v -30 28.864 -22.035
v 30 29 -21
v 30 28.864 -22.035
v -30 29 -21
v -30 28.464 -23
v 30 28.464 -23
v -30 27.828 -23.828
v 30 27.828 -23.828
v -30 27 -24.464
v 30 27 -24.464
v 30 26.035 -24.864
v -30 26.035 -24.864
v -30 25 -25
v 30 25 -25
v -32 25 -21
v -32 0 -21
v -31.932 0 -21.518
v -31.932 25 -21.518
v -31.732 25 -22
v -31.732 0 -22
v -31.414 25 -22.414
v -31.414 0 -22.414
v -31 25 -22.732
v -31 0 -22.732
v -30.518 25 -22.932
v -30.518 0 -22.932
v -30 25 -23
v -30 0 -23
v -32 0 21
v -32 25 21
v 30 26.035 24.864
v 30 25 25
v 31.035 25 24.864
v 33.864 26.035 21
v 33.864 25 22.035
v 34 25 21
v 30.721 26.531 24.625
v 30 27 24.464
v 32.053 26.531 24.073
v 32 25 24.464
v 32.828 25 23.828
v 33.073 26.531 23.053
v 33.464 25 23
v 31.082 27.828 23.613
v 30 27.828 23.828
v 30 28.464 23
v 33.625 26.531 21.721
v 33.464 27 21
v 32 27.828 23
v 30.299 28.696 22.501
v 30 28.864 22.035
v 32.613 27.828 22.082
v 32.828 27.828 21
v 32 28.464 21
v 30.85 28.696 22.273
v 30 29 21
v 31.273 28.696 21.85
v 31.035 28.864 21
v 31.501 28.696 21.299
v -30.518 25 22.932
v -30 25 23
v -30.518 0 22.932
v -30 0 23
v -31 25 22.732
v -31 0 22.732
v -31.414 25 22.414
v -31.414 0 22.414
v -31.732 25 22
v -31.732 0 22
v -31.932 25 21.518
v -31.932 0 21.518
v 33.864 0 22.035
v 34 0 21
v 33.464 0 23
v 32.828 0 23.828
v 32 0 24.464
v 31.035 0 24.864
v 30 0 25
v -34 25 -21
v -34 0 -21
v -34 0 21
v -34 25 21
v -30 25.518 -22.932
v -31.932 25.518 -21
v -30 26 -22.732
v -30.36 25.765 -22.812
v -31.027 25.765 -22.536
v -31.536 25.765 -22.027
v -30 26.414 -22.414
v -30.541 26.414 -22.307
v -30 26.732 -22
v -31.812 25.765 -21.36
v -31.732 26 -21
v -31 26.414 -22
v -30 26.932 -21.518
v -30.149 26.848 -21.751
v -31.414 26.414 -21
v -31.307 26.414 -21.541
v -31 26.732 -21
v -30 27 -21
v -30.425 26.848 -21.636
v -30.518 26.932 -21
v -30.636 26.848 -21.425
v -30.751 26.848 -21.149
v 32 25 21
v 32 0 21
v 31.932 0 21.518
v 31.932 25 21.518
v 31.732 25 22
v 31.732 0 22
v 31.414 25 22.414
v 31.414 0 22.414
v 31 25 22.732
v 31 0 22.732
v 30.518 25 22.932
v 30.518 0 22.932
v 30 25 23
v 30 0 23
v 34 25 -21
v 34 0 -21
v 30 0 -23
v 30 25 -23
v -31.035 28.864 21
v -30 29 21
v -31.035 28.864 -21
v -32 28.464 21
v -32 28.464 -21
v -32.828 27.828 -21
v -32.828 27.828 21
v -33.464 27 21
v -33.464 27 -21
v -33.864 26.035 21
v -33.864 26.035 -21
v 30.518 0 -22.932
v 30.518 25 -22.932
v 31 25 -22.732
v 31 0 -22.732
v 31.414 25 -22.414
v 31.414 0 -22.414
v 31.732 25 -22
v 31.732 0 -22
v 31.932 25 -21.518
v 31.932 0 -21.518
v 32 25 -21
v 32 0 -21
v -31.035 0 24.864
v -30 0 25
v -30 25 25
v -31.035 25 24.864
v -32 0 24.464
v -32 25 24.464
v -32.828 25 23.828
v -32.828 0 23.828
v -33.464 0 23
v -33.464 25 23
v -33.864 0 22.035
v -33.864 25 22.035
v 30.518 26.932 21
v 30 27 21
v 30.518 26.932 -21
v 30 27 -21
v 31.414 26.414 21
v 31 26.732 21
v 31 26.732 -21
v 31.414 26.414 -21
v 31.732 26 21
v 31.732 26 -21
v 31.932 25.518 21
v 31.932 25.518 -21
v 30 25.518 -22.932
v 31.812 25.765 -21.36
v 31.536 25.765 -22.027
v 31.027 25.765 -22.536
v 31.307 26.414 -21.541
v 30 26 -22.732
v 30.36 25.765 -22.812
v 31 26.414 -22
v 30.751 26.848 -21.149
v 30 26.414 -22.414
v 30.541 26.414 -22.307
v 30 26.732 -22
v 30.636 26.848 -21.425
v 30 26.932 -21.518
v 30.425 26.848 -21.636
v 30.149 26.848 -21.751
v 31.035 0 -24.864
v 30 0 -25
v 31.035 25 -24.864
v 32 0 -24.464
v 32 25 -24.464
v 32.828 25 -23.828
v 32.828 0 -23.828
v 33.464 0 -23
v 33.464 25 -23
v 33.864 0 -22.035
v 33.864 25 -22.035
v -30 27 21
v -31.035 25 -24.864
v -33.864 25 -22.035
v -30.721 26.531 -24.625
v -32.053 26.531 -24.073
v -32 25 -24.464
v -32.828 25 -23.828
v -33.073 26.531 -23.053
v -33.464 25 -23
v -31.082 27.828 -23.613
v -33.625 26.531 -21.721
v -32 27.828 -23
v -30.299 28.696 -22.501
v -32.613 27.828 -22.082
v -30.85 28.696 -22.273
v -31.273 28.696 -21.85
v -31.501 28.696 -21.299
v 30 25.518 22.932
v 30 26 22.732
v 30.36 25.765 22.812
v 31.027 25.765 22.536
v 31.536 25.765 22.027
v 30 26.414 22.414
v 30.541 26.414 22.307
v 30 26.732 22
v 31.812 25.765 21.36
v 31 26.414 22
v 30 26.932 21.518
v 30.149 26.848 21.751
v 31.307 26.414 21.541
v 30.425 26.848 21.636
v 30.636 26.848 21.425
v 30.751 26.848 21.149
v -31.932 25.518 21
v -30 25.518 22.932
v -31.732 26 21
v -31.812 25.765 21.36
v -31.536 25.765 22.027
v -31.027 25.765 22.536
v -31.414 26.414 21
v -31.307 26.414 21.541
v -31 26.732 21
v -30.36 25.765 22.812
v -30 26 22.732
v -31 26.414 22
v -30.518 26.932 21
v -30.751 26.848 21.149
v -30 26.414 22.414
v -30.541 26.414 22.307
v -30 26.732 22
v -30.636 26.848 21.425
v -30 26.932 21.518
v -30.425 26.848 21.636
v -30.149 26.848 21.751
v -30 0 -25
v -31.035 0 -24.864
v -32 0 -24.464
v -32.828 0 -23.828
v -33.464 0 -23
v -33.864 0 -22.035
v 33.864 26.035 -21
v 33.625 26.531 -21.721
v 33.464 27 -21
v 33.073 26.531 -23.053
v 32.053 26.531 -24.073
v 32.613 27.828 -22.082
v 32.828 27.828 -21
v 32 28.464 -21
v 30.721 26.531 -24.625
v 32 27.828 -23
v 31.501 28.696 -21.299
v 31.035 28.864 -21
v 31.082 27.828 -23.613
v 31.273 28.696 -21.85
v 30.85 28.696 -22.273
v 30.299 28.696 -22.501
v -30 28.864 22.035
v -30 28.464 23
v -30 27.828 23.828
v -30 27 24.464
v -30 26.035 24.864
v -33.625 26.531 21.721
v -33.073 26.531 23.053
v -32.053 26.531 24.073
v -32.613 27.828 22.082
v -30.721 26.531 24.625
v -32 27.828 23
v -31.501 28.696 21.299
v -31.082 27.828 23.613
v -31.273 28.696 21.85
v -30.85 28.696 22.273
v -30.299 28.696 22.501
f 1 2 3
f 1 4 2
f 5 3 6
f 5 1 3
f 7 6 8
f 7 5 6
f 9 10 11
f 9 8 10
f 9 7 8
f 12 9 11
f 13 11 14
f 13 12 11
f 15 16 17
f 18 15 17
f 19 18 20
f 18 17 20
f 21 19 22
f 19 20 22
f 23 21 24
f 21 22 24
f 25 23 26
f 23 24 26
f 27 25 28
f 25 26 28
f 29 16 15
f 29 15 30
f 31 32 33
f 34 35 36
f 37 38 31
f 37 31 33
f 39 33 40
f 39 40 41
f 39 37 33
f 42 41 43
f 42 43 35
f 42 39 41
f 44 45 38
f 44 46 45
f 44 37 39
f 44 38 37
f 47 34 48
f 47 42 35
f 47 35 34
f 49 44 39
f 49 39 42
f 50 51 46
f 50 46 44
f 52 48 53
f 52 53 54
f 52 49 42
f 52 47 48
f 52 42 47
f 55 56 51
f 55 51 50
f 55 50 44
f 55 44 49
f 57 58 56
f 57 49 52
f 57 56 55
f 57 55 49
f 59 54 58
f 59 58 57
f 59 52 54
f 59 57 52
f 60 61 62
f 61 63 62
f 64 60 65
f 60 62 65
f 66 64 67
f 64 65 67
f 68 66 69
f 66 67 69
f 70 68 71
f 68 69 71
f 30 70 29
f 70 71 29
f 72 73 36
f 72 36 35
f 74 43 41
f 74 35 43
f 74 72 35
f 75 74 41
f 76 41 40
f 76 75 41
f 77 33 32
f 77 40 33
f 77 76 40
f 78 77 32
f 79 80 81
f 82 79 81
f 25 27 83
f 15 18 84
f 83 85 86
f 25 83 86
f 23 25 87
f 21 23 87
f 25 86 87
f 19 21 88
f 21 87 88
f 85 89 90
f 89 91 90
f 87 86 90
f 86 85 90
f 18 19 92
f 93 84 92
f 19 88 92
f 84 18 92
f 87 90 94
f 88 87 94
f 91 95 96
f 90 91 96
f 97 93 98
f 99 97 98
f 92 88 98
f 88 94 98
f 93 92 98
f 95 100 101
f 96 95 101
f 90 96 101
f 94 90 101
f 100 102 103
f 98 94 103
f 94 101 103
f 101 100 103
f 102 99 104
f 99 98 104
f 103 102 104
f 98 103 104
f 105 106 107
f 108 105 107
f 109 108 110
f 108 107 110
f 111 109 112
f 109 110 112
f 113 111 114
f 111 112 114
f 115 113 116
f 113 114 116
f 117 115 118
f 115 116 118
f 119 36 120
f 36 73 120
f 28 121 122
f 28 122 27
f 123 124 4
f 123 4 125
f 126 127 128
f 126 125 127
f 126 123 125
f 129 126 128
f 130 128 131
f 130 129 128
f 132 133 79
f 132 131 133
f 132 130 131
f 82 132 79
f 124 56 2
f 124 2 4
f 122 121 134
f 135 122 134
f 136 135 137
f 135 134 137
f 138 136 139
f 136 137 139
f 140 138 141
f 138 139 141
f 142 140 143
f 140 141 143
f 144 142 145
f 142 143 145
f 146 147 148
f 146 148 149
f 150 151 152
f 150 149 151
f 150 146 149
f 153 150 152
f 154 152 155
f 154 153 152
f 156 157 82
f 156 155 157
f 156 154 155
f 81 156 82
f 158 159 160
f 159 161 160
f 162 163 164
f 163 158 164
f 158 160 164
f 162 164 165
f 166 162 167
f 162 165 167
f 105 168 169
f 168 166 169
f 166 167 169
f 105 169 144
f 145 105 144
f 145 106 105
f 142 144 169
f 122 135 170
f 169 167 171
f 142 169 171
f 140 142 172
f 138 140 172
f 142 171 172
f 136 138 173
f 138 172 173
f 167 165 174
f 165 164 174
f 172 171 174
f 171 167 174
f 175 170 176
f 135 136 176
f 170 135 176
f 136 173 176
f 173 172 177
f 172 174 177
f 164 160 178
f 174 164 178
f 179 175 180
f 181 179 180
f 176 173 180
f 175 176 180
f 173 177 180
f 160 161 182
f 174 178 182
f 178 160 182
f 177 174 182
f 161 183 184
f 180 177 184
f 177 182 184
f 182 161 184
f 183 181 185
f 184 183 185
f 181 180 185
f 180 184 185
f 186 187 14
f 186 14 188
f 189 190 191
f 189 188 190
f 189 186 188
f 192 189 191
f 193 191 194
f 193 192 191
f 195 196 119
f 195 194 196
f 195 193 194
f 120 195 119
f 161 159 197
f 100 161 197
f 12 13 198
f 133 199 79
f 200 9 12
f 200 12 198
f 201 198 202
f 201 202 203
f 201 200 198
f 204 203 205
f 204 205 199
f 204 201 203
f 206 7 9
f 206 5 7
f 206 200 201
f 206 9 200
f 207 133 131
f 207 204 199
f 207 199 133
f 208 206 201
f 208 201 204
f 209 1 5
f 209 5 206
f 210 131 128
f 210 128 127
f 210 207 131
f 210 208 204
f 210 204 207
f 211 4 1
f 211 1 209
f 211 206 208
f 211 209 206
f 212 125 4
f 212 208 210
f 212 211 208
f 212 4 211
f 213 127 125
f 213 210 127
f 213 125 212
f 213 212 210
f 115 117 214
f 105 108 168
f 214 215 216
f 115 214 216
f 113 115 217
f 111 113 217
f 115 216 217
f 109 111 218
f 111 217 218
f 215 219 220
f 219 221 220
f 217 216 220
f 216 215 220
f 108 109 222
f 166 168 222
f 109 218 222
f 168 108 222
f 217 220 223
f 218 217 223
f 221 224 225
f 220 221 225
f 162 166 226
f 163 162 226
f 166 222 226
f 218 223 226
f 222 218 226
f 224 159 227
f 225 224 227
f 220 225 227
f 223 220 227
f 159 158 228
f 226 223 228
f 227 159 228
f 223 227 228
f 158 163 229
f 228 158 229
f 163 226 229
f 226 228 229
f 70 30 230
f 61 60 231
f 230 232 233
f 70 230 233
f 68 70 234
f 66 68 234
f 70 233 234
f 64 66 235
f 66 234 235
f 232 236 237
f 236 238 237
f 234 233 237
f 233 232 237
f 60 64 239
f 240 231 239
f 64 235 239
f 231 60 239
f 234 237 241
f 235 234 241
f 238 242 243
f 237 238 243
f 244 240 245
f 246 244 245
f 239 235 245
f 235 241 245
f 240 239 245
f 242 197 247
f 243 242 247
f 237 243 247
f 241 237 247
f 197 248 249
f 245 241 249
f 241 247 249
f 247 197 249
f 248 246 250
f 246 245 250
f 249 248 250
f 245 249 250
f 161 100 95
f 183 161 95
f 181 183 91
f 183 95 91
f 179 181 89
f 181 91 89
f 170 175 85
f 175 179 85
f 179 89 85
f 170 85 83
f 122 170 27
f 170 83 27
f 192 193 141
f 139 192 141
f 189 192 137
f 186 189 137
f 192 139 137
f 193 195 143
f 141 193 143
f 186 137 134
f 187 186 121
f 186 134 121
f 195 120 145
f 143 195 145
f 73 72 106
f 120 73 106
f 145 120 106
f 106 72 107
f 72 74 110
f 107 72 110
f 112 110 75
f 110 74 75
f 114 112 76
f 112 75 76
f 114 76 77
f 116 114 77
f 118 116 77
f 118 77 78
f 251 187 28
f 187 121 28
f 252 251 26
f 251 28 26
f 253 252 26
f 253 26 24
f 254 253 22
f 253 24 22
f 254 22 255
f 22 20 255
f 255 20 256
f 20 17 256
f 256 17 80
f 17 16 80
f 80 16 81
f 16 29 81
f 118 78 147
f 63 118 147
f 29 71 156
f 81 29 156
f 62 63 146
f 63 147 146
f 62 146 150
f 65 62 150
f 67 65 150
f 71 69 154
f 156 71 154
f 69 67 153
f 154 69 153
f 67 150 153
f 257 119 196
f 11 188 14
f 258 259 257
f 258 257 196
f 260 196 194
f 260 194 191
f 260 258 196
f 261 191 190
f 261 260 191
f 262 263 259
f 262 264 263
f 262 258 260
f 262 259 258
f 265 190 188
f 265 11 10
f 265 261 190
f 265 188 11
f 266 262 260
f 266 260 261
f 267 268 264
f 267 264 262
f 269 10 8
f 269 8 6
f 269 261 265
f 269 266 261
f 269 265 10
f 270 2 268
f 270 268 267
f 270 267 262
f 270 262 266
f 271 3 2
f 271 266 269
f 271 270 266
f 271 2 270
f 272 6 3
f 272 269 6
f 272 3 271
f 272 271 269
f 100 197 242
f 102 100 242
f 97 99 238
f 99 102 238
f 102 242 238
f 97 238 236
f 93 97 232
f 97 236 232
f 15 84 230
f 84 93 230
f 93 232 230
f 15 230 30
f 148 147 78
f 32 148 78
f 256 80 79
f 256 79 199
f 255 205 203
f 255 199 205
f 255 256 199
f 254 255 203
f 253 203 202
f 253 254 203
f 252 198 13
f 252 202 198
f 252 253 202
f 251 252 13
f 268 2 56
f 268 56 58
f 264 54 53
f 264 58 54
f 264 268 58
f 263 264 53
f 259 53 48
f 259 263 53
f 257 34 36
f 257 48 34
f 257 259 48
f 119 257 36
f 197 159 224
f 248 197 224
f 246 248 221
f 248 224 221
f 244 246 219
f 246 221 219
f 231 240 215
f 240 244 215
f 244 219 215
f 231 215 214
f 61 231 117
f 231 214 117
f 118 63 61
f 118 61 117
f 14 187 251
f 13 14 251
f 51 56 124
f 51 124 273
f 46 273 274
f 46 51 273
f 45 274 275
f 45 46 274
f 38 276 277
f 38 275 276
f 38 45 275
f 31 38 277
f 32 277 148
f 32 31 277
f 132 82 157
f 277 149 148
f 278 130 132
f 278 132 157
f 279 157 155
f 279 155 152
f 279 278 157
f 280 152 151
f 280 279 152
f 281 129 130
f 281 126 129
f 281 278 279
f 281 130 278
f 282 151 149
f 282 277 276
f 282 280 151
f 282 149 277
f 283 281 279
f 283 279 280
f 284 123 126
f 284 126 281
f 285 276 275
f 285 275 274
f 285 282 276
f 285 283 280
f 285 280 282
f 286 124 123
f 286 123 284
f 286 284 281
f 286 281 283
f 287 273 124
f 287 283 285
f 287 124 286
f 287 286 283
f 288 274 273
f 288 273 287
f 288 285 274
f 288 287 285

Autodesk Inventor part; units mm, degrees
ref_plane "YZ Plane" through (0, 0, 0) normal (1, 0, 0) x (0, 1, 0)
ref_plane "XZ Plane" through (0, 0, 0) normal (0, 1, 0) x (-1, 0, 0)
ref_plane "XY Plane" through (0, 0, 0) normal (0, 0, 1) x (1, 0, 0)
sketch "Sketch1" plane through (0, 0, 0) normal (0, 1, 0) x (-1, 0, 0)
  line L0 (30, 25) -> (-30, 25)
  line L1 (-34, 21) -> (-34, -21)
  line L2 (-30, -25) -> (30, -25)
  line L3 (34, -21) -> (34, 21)
  line L4 (34, 25) -> (-34, -25) construction
  line L5 (-34, 25) -> (34, -25) construction
  arc A0 (30, -25) -> (34, -21) centre (30, -21) ccw
  arc A1 (34, 21) -> (30, 25) centre (30, 21) ccw
  arc A2 (-30, 25) -> (-34, 21) centre (-30, 21) ccw
  arc A3 (-34, -21) -> (-30, -25) centre (-30, -21) ccw
  point P0 (0, 0)
  dimension "d0" = 68
  dimension "d1" = 50
  dimension "d2" = 4
extrude "Extrusion1" add sketch "Sketch1" along normal blind 29
fillet "Fillet1" radius 4 8 edges at (32.8284, 29, 23.8284) (34, 29, 0) (32.8284, 29, -23.8284) (0, 29, -25) (-32.8284, 29, -23.8284) (-34, 29, 0) (-32.8284, 29, 23.8284) (0, 29, 25)
shell "Shell1" thickness 2 removed faces 1 at (10, 0, 8.3333)
properties part number "Fuse Box 6-way-lid" material "PMMA Plastic"
